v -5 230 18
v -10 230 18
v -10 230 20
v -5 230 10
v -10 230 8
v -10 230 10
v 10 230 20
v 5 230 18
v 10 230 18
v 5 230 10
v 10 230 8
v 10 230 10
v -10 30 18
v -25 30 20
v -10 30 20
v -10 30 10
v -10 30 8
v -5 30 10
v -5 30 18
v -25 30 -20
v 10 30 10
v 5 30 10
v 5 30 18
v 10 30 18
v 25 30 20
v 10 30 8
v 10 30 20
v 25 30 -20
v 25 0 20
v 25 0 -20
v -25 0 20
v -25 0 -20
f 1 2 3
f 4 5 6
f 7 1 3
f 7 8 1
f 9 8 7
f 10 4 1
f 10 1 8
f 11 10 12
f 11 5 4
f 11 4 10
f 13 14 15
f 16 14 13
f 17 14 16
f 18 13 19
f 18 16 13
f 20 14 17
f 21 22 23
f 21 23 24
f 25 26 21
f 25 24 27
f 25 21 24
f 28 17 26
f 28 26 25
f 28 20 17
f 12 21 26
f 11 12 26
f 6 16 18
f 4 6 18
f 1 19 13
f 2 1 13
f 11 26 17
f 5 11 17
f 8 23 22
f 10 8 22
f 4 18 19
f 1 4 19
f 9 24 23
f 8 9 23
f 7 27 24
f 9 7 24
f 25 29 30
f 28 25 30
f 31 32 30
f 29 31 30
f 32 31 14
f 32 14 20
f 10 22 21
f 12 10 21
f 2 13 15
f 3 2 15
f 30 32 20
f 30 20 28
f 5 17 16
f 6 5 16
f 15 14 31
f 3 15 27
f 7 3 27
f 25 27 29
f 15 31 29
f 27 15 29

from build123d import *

# Parameters (mm, degrees)
ESQUISSE1_W        = 50
ESQUISSE1_H        = 40
BOSS_EXTRU_1_DEPTH = 30
BOSS_EXTRU_2_DEPTH = 200


with BuildPart() as part:
    # Esquisse1 → Boss.-Extru.1 (new body)
    with BuildSketch(Plane(origin=(0, 0, 0), x_dir=(1, 0, 0), z_dir=(0, 1, 0))):
        Rectangle(ESQUISSE1_W, ESQUISSE1_H)
    extrude(amount=BOSS_EXTRU_1_DEPTH)

    # Esquisse2 → Boss.-Extru.2 (add)
    with BuildSketch(Plane(origin=(0, 30, 0), x_dir=(1, 0, 0), z_dir=(0, 1, 0))):
        Polygon((-10, -20), (10, -20), (10, -18), (5, -18), (5, -10), (10, -10), (10, -8), (-10, -8), (-10, -10), (-5, -10), (-5, -18), (-10, -18), align=None)
    extrude(amount=BOSS_EXTRU_2_DEPTH)


solid = part.part
